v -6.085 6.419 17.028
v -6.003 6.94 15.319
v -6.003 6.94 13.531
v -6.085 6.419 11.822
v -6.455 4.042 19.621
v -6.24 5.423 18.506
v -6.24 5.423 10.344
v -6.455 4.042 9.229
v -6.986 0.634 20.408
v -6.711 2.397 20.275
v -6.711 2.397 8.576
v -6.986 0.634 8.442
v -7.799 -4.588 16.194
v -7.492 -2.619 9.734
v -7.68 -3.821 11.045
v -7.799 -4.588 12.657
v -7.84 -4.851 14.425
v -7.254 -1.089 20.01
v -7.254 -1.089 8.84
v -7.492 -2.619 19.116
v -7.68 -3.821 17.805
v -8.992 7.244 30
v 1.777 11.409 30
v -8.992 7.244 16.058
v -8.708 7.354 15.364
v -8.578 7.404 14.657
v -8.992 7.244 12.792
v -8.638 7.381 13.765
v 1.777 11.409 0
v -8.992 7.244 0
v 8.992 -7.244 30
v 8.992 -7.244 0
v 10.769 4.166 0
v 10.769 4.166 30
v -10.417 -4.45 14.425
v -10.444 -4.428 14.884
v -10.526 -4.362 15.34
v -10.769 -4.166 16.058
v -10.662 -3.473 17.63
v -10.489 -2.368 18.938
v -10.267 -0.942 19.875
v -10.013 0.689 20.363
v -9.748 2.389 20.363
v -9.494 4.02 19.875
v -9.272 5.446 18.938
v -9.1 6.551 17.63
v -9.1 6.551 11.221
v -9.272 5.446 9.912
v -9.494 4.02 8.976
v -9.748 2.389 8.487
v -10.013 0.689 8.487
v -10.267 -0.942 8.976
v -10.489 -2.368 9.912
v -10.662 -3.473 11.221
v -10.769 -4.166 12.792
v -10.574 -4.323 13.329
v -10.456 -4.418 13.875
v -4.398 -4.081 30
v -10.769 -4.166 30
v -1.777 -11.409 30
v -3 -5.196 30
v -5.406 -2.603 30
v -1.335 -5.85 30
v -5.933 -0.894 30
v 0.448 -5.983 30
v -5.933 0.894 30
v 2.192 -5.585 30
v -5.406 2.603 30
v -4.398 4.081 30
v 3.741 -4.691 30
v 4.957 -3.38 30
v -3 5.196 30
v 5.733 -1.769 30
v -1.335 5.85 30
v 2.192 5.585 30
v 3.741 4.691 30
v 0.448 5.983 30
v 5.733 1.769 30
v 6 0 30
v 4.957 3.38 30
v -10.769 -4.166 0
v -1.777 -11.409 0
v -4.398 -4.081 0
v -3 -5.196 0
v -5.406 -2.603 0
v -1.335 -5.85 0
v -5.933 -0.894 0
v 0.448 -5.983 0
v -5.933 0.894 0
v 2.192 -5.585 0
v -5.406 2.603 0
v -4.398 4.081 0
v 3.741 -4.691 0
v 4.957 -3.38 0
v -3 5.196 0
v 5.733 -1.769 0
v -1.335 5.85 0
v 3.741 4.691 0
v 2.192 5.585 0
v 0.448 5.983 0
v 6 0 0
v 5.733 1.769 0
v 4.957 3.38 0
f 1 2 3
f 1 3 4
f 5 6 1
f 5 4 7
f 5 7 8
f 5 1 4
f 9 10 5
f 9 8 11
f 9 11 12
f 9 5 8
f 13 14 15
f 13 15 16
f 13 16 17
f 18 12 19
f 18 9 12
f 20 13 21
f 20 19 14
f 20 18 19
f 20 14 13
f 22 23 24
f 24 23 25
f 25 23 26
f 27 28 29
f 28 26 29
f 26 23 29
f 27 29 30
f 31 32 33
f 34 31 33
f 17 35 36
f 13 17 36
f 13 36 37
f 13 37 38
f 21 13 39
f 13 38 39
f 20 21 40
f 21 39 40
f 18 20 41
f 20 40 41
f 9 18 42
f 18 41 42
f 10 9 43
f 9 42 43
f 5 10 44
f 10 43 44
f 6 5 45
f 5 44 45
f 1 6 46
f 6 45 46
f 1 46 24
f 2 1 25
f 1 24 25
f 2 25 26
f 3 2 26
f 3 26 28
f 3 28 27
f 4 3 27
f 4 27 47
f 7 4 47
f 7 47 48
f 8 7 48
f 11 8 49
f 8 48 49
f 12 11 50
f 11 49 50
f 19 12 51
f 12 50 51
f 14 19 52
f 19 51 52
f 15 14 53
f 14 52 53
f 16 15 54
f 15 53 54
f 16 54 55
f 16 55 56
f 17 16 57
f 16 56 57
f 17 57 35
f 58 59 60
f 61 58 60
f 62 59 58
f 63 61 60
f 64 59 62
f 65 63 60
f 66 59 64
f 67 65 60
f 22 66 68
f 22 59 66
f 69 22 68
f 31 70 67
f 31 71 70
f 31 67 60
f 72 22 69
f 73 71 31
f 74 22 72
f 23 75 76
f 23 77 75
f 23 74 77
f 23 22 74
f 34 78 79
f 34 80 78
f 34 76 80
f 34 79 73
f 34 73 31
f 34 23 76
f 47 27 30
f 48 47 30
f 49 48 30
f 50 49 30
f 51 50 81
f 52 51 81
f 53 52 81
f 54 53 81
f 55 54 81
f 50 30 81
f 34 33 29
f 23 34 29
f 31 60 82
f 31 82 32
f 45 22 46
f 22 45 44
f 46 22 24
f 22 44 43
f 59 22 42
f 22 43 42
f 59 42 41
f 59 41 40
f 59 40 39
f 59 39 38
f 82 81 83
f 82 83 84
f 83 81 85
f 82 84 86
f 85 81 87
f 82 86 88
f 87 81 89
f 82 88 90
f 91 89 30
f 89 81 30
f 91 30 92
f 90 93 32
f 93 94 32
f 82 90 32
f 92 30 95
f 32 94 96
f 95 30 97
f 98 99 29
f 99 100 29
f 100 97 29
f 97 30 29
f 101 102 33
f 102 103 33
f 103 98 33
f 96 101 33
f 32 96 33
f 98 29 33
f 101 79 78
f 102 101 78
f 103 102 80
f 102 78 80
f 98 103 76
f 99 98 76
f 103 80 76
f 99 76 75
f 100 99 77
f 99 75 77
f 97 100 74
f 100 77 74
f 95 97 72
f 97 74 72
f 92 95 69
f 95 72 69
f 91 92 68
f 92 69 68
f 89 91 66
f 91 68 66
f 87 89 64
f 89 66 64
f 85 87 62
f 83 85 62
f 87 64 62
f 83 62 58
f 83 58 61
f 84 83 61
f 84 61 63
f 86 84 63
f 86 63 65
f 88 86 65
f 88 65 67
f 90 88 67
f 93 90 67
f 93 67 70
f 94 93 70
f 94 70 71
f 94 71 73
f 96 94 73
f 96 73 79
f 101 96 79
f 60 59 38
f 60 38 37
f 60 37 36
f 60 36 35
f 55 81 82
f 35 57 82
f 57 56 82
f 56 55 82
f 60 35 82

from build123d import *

# Parameters (mm, degrees)
EXTRUDE_1_DEPTH     = 30
SKETCH_2_R          = 6
CUT_EXTRUDE_1_DEPTH = 34.854921873
SKETCH_4_R          = 6
CUT_EXTRUDE_2_DEPTH = 3


with BuildPart() as part:
    # Эскиз1 → Бобышка-Вытянуть1 (new body)
    with BuildSketch(Plane.XY):
        Polygon((8.992275581, -7.243777551), (10.769433169, 4.165650315), (1.777157588, 11.409427866), (-8.992275581, 7.243777551), (-10.769433169, -4.165650315), (-1.777157588, -11.409427866), align=None)
    extrude(amount=EXTRUDE_1_DEPTH)

    # Эскиз2 → Вырез-Вытянуть1 (cut, through all)
    with BuildSketch(Plane.XY.offset(30)):
        Circle(SKETCH_2_R)
    extrude(amount=-CUT_EXTRUDE_1_DEPTH, mode=Mode.SUBTRACT)

    # Эскиз4 → Вырез-Вытянуть2 (cut)
    with BuildSketch(Plane(origin=(-9.880854375, 1.539063618, 0), x_dir=(0, 0, 1), z_dir=(-0.9880854374988838, 0.15390636180041273, 0))):
        with Locations(Location((14.425169577, 0, 0), (0, 0, 270))):
            Circle(SKETCH_4_R)
    extrude(amount=-CUT_EXTRUDE_2_DEPTH, mode=Mode.SUBTRACT)


solid = part.part
